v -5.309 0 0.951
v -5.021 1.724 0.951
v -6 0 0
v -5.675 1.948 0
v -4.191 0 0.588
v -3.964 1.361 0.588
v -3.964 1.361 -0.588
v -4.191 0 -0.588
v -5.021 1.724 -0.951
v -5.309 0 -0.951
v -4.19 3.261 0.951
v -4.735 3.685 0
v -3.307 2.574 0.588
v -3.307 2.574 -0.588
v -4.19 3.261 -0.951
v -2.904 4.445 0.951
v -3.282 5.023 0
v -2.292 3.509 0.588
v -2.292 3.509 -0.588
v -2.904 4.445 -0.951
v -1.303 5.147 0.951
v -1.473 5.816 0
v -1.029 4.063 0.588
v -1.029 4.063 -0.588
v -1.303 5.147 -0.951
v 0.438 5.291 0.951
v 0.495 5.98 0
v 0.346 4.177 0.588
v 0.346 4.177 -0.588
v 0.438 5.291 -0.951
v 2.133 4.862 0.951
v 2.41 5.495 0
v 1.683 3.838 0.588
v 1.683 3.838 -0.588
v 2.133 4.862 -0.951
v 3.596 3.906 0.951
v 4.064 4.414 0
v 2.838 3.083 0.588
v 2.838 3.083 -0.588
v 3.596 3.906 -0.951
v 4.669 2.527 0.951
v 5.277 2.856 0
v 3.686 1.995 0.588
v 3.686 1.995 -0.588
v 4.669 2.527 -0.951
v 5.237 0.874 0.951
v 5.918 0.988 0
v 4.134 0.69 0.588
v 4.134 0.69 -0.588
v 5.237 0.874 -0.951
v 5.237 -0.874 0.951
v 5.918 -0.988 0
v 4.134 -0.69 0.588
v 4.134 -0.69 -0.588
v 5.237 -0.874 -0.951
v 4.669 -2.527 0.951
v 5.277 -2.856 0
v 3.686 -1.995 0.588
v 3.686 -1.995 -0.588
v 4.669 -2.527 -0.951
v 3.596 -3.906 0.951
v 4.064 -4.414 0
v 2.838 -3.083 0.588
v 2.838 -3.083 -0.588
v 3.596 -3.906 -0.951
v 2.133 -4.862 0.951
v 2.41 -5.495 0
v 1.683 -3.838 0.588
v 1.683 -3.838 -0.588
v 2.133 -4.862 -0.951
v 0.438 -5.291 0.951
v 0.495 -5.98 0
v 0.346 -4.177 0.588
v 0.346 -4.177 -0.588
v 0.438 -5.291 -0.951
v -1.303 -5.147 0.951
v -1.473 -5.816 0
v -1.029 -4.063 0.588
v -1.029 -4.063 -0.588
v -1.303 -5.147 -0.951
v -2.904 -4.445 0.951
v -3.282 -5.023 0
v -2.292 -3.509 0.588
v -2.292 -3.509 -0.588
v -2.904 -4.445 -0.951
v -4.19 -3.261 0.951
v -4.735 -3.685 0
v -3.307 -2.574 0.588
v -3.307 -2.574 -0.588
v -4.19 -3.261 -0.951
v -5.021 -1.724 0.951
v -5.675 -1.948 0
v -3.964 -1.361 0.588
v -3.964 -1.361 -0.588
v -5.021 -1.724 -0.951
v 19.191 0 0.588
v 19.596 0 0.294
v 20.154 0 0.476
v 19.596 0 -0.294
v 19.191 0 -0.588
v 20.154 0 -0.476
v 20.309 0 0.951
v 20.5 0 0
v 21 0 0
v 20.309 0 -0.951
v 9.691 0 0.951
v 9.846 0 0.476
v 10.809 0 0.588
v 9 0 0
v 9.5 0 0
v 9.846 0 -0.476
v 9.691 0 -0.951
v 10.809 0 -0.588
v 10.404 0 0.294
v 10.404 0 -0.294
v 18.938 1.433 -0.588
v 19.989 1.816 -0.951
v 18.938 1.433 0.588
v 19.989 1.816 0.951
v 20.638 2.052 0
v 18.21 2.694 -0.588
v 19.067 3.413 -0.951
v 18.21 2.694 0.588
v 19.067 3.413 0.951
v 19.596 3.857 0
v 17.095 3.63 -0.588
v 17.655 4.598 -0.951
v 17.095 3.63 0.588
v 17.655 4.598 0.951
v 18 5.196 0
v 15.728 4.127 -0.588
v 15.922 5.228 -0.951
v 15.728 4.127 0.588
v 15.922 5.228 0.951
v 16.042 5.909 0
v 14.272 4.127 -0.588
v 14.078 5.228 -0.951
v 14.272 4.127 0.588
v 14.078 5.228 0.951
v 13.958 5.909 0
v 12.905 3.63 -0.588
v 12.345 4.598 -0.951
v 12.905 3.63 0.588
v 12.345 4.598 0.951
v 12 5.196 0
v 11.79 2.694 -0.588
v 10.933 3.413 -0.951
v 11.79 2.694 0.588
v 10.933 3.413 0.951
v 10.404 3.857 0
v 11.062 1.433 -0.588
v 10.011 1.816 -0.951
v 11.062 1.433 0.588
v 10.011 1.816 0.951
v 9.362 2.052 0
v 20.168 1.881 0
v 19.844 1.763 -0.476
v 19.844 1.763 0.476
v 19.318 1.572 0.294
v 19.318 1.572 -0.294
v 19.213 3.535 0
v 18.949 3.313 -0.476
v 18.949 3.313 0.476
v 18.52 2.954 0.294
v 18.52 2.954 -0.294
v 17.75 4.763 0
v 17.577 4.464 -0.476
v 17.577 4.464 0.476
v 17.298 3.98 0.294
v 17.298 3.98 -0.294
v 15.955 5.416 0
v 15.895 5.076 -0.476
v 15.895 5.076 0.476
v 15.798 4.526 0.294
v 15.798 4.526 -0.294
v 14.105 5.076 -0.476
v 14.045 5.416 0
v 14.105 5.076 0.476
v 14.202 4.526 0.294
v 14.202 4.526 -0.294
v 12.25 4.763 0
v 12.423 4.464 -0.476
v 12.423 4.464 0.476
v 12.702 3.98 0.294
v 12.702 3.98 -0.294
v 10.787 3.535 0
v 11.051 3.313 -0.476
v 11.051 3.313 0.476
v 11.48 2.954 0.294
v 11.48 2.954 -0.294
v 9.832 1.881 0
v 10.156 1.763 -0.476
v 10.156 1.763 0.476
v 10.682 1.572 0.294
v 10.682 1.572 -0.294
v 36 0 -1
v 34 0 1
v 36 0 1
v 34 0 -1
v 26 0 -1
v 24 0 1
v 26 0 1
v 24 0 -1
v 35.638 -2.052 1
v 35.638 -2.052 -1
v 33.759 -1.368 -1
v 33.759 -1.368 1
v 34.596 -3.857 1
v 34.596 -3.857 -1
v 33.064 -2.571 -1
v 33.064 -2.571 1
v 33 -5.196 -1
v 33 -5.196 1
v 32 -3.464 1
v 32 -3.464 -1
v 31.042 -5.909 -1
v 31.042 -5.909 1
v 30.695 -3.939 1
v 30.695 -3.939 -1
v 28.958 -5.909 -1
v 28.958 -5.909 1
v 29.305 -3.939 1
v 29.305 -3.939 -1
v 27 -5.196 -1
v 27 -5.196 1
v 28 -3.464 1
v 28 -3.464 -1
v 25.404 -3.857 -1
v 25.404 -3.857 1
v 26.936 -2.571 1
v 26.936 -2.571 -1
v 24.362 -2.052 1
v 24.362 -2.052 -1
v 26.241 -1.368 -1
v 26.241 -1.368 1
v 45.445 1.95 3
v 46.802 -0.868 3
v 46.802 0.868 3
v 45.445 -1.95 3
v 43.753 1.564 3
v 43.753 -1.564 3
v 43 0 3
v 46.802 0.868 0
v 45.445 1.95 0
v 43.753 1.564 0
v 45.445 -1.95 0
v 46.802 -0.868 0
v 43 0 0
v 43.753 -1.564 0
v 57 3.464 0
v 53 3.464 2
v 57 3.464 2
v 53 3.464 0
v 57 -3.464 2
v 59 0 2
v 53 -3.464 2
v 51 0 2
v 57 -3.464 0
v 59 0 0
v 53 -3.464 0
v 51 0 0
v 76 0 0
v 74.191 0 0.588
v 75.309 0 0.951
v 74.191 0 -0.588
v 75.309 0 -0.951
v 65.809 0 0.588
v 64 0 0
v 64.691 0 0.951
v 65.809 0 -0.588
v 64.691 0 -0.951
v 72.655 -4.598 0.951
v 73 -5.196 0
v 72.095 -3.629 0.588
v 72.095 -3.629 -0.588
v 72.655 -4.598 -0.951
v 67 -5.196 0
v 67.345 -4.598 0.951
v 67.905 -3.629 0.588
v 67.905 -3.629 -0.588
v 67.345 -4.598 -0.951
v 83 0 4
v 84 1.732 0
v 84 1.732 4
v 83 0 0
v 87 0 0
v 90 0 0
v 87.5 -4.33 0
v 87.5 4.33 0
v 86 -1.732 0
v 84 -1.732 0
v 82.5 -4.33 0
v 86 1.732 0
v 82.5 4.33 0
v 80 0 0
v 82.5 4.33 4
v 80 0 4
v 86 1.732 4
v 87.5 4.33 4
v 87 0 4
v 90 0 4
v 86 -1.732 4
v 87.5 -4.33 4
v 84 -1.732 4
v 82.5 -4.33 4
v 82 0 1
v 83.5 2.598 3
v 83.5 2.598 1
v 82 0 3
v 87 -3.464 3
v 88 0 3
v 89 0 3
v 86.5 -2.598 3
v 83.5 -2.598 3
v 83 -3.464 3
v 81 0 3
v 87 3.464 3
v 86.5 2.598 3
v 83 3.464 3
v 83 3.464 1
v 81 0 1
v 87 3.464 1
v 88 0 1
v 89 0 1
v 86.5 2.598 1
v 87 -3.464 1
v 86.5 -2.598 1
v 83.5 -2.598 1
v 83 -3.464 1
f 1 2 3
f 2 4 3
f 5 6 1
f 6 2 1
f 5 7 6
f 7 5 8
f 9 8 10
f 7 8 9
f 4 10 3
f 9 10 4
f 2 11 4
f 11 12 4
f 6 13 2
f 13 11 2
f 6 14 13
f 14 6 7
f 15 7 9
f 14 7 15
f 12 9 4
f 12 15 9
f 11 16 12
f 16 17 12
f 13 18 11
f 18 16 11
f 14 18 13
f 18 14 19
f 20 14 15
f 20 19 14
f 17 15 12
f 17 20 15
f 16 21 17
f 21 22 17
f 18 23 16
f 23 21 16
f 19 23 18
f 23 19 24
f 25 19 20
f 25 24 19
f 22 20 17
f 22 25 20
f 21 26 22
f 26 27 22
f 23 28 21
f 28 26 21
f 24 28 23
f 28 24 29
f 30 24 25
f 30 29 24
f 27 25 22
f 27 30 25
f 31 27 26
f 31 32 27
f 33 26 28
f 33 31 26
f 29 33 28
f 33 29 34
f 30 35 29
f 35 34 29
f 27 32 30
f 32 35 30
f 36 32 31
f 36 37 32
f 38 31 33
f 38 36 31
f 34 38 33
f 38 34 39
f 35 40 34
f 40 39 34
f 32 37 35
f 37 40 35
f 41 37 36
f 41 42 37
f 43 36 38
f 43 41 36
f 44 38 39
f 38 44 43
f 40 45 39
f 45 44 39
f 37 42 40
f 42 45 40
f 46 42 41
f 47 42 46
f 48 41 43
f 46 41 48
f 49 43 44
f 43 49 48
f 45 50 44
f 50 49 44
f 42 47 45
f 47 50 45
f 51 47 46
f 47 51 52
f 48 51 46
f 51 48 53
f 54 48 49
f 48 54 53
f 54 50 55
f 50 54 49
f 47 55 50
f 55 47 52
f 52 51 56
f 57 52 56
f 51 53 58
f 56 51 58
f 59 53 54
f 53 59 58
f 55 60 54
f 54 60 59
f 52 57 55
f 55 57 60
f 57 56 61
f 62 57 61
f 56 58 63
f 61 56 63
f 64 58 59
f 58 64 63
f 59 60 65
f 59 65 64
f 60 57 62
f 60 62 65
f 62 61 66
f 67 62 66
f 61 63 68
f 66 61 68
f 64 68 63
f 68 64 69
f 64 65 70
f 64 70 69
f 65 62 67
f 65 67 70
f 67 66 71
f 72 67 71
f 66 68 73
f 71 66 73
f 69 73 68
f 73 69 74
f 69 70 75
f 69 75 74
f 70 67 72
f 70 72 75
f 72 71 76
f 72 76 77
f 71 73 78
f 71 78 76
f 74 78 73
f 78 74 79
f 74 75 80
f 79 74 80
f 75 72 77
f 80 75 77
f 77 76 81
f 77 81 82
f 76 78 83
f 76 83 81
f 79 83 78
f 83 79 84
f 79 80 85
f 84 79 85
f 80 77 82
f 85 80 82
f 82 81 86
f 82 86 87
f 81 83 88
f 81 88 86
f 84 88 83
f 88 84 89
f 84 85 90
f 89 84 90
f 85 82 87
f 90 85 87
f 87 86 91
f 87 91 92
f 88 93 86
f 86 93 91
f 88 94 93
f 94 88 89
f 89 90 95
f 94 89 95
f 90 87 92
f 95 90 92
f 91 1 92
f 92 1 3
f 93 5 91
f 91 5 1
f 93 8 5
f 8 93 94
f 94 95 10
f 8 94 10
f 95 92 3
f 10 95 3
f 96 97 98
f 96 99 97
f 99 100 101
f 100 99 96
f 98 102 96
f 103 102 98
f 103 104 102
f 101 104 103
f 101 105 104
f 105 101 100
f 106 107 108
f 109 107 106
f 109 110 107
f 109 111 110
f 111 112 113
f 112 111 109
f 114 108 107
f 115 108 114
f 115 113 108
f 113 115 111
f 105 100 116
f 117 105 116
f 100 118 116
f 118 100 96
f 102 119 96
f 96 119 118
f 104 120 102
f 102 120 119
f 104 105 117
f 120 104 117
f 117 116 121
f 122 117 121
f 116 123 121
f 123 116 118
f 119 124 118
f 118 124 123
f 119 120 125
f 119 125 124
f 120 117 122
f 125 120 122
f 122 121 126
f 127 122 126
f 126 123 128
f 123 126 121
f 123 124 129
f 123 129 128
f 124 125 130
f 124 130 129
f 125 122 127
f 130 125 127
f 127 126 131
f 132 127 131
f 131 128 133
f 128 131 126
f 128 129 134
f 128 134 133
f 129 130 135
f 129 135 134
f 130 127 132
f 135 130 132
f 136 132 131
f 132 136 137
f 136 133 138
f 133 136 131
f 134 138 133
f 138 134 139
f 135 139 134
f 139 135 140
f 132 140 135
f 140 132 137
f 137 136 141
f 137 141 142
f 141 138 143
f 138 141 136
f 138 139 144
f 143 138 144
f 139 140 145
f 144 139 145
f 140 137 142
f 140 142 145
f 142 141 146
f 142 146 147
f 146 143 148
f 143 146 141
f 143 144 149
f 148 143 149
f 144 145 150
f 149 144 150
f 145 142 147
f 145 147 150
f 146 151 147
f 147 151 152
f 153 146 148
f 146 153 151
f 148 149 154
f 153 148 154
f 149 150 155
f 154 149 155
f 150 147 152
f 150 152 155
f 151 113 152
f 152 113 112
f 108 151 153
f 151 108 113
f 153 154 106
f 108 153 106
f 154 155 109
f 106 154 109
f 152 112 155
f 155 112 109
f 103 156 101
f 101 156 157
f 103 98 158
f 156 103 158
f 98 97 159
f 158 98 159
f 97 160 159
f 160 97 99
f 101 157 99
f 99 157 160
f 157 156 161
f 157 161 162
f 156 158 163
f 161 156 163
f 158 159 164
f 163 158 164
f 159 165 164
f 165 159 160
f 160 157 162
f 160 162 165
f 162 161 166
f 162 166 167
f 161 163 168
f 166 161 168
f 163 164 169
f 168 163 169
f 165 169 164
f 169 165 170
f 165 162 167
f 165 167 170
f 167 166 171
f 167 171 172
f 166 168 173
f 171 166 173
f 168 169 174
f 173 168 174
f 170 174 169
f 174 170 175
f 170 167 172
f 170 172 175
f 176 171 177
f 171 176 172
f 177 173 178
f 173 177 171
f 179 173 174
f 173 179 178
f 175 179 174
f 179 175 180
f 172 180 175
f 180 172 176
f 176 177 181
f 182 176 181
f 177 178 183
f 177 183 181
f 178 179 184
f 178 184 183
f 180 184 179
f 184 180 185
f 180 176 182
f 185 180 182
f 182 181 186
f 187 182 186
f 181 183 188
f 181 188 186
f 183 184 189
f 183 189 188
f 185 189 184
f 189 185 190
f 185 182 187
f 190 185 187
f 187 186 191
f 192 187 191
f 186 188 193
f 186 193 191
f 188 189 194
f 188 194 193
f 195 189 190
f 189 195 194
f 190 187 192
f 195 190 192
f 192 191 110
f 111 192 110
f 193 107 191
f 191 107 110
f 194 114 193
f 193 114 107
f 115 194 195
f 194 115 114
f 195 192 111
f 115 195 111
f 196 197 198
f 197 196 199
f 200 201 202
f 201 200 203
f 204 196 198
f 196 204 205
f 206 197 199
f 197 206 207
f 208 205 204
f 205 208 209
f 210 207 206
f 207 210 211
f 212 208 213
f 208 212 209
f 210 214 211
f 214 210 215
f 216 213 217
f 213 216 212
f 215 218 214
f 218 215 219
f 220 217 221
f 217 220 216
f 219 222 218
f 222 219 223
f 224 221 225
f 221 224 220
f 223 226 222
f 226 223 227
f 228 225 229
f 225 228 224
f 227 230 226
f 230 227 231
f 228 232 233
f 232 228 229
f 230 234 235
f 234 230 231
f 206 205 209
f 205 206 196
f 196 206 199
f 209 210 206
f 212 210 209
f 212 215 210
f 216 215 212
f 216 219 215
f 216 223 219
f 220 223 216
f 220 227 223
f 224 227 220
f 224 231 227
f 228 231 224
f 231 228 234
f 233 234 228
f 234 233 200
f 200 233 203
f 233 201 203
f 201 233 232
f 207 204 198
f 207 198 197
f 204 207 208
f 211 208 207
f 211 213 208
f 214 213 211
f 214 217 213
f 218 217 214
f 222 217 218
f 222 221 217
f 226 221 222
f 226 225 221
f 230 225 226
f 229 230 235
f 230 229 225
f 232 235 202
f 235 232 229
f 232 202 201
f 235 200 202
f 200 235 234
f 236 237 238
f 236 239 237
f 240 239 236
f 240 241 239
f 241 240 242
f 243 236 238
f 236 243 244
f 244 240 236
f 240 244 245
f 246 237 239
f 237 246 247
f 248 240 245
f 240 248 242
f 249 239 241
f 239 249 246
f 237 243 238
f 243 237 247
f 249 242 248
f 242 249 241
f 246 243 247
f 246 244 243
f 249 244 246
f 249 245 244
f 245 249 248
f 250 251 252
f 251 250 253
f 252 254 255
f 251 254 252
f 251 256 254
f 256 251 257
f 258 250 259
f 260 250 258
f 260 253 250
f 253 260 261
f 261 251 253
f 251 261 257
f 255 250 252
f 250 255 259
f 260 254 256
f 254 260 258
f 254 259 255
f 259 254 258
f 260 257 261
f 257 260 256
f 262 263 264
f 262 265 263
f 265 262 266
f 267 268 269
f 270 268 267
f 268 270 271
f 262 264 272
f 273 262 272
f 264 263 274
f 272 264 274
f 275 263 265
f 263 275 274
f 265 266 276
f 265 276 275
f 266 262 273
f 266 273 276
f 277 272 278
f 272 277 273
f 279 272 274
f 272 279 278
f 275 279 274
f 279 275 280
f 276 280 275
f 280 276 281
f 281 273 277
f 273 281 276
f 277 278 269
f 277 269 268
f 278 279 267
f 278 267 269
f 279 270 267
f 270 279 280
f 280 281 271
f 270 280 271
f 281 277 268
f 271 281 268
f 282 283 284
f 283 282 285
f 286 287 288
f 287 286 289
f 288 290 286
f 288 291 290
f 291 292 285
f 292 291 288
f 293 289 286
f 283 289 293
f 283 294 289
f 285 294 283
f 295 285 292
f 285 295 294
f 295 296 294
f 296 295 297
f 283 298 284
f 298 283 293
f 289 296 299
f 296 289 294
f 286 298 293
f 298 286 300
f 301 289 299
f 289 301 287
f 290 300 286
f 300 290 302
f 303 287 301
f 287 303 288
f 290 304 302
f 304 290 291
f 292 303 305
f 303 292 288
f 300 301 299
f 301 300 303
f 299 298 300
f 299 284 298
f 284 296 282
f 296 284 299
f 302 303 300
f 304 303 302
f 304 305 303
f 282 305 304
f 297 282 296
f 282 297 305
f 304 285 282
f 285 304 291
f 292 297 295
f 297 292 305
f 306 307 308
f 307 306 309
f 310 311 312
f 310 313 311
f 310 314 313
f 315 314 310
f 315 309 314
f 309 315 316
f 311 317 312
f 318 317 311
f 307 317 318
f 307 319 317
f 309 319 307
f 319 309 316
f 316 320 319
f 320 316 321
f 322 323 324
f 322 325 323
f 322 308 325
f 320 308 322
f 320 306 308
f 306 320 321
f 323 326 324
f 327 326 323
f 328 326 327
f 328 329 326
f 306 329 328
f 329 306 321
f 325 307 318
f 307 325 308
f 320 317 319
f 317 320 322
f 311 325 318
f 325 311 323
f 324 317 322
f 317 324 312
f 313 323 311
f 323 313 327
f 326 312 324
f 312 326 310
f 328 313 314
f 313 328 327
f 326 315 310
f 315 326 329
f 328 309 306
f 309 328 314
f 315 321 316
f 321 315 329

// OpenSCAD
rotate_extrude() translate([5, 0]) circle(r=1);
translate([15, 0, 0]) rotate_extrude(angle=180)
  translate([5, 0]) difference() { circle(r=1); circle(r=0.5); }
translate([30, 0, 0]) rotate_extrude(angle=-180, start=90)
  translate([5, 0]) square([2, 2], center=true);
translate([45, 0, 0]) rotate_extrude() square([2, 3]);
translate([55, 0, 0]) rotate_extrude($fn=6) square([4, 2]);
translate([70, 0, 0]) rotate_extrude(angle=-180, start=90, $fn=6)
  translate([5, 0]) circle(r=1, $fn=0);
translate([85, 0, 0]) rotate_extrude($fn=6)
  polygon(points=[[2,0], [5,0], [5,4], [2,4], [3,1], [4,1], [4,3], [3,3]],
          paths=[[0,1,2,3], [4,5,6,7]]);
